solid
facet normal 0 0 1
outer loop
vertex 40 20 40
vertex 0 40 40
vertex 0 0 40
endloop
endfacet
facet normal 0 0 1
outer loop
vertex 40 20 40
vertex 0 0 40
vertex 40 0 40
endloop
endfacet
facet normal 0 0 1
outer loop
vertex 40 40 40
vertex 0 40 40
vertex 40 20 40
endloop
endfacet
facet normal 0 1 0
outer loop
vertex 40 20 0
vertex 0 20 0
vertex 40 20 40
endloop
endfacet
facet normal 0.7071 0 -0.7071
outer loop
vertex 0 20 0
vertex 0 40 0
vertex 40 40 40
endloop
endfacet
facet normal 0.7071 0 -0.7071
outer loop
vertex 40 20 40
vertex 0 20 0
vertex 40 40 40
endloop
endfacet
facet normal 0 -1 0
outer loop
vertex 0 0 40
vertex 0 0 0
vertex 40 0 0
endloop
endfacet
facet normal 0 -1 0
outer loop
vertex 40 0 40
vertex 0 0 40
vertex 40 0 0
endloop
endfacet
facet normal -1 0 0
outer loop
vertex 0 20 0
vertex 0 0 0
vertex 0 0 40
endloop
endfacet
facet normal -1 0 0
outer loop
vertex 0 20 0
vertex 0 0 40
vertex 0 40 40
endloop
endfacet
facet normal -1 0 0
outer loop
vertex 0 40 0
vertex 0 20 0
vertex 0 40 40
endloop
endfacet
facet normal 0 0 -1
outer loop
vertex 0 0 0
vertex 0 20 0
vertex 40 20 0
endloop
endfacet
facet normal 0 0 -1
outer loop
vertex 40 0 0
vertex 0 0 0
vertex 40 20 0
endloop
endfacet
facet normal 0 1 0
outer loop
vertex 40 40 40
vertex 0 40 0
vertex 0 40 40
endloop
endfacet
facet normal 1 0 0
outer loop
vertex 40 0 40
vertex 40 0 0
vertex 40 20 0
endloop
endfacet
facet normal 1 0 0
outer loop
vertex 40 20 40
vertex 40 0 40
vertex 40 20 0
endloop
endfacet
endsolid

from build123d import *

# Parameters (mm, degrees)
SKETCH1_W           = 40
SKETCH1_H           = 40
BOSS_EXTRUDE1_DEPTH = 40
CUT_EXTRUDE1_DEPTH  = 20


with BuildPart() as part:
    # Sketch1 → Boss-Extrude1 (new body)
    with BuildSketch(Plane.XY):
        with Locations((20, 20)):
            Rectangle(SKETCH1_W, SKETCH1_H)
    extrude(amount=BOSS_EXTRUDE1_DEPTH)

    # Sketch2 → Cut-Extrude1 (cut)
    with BuildSketch(Plane(origin=(0, 40, 0), x_dir=(1, 0, 0), z_dir=(0, 1, 0))):
        Polygon((0, 0), (40, -40), (40, 0), align=None)
    extrude(amount=-CUT_EXTRUDE1_DEPTH, mode=Mode.SUBTRACT)


solid = part.part
